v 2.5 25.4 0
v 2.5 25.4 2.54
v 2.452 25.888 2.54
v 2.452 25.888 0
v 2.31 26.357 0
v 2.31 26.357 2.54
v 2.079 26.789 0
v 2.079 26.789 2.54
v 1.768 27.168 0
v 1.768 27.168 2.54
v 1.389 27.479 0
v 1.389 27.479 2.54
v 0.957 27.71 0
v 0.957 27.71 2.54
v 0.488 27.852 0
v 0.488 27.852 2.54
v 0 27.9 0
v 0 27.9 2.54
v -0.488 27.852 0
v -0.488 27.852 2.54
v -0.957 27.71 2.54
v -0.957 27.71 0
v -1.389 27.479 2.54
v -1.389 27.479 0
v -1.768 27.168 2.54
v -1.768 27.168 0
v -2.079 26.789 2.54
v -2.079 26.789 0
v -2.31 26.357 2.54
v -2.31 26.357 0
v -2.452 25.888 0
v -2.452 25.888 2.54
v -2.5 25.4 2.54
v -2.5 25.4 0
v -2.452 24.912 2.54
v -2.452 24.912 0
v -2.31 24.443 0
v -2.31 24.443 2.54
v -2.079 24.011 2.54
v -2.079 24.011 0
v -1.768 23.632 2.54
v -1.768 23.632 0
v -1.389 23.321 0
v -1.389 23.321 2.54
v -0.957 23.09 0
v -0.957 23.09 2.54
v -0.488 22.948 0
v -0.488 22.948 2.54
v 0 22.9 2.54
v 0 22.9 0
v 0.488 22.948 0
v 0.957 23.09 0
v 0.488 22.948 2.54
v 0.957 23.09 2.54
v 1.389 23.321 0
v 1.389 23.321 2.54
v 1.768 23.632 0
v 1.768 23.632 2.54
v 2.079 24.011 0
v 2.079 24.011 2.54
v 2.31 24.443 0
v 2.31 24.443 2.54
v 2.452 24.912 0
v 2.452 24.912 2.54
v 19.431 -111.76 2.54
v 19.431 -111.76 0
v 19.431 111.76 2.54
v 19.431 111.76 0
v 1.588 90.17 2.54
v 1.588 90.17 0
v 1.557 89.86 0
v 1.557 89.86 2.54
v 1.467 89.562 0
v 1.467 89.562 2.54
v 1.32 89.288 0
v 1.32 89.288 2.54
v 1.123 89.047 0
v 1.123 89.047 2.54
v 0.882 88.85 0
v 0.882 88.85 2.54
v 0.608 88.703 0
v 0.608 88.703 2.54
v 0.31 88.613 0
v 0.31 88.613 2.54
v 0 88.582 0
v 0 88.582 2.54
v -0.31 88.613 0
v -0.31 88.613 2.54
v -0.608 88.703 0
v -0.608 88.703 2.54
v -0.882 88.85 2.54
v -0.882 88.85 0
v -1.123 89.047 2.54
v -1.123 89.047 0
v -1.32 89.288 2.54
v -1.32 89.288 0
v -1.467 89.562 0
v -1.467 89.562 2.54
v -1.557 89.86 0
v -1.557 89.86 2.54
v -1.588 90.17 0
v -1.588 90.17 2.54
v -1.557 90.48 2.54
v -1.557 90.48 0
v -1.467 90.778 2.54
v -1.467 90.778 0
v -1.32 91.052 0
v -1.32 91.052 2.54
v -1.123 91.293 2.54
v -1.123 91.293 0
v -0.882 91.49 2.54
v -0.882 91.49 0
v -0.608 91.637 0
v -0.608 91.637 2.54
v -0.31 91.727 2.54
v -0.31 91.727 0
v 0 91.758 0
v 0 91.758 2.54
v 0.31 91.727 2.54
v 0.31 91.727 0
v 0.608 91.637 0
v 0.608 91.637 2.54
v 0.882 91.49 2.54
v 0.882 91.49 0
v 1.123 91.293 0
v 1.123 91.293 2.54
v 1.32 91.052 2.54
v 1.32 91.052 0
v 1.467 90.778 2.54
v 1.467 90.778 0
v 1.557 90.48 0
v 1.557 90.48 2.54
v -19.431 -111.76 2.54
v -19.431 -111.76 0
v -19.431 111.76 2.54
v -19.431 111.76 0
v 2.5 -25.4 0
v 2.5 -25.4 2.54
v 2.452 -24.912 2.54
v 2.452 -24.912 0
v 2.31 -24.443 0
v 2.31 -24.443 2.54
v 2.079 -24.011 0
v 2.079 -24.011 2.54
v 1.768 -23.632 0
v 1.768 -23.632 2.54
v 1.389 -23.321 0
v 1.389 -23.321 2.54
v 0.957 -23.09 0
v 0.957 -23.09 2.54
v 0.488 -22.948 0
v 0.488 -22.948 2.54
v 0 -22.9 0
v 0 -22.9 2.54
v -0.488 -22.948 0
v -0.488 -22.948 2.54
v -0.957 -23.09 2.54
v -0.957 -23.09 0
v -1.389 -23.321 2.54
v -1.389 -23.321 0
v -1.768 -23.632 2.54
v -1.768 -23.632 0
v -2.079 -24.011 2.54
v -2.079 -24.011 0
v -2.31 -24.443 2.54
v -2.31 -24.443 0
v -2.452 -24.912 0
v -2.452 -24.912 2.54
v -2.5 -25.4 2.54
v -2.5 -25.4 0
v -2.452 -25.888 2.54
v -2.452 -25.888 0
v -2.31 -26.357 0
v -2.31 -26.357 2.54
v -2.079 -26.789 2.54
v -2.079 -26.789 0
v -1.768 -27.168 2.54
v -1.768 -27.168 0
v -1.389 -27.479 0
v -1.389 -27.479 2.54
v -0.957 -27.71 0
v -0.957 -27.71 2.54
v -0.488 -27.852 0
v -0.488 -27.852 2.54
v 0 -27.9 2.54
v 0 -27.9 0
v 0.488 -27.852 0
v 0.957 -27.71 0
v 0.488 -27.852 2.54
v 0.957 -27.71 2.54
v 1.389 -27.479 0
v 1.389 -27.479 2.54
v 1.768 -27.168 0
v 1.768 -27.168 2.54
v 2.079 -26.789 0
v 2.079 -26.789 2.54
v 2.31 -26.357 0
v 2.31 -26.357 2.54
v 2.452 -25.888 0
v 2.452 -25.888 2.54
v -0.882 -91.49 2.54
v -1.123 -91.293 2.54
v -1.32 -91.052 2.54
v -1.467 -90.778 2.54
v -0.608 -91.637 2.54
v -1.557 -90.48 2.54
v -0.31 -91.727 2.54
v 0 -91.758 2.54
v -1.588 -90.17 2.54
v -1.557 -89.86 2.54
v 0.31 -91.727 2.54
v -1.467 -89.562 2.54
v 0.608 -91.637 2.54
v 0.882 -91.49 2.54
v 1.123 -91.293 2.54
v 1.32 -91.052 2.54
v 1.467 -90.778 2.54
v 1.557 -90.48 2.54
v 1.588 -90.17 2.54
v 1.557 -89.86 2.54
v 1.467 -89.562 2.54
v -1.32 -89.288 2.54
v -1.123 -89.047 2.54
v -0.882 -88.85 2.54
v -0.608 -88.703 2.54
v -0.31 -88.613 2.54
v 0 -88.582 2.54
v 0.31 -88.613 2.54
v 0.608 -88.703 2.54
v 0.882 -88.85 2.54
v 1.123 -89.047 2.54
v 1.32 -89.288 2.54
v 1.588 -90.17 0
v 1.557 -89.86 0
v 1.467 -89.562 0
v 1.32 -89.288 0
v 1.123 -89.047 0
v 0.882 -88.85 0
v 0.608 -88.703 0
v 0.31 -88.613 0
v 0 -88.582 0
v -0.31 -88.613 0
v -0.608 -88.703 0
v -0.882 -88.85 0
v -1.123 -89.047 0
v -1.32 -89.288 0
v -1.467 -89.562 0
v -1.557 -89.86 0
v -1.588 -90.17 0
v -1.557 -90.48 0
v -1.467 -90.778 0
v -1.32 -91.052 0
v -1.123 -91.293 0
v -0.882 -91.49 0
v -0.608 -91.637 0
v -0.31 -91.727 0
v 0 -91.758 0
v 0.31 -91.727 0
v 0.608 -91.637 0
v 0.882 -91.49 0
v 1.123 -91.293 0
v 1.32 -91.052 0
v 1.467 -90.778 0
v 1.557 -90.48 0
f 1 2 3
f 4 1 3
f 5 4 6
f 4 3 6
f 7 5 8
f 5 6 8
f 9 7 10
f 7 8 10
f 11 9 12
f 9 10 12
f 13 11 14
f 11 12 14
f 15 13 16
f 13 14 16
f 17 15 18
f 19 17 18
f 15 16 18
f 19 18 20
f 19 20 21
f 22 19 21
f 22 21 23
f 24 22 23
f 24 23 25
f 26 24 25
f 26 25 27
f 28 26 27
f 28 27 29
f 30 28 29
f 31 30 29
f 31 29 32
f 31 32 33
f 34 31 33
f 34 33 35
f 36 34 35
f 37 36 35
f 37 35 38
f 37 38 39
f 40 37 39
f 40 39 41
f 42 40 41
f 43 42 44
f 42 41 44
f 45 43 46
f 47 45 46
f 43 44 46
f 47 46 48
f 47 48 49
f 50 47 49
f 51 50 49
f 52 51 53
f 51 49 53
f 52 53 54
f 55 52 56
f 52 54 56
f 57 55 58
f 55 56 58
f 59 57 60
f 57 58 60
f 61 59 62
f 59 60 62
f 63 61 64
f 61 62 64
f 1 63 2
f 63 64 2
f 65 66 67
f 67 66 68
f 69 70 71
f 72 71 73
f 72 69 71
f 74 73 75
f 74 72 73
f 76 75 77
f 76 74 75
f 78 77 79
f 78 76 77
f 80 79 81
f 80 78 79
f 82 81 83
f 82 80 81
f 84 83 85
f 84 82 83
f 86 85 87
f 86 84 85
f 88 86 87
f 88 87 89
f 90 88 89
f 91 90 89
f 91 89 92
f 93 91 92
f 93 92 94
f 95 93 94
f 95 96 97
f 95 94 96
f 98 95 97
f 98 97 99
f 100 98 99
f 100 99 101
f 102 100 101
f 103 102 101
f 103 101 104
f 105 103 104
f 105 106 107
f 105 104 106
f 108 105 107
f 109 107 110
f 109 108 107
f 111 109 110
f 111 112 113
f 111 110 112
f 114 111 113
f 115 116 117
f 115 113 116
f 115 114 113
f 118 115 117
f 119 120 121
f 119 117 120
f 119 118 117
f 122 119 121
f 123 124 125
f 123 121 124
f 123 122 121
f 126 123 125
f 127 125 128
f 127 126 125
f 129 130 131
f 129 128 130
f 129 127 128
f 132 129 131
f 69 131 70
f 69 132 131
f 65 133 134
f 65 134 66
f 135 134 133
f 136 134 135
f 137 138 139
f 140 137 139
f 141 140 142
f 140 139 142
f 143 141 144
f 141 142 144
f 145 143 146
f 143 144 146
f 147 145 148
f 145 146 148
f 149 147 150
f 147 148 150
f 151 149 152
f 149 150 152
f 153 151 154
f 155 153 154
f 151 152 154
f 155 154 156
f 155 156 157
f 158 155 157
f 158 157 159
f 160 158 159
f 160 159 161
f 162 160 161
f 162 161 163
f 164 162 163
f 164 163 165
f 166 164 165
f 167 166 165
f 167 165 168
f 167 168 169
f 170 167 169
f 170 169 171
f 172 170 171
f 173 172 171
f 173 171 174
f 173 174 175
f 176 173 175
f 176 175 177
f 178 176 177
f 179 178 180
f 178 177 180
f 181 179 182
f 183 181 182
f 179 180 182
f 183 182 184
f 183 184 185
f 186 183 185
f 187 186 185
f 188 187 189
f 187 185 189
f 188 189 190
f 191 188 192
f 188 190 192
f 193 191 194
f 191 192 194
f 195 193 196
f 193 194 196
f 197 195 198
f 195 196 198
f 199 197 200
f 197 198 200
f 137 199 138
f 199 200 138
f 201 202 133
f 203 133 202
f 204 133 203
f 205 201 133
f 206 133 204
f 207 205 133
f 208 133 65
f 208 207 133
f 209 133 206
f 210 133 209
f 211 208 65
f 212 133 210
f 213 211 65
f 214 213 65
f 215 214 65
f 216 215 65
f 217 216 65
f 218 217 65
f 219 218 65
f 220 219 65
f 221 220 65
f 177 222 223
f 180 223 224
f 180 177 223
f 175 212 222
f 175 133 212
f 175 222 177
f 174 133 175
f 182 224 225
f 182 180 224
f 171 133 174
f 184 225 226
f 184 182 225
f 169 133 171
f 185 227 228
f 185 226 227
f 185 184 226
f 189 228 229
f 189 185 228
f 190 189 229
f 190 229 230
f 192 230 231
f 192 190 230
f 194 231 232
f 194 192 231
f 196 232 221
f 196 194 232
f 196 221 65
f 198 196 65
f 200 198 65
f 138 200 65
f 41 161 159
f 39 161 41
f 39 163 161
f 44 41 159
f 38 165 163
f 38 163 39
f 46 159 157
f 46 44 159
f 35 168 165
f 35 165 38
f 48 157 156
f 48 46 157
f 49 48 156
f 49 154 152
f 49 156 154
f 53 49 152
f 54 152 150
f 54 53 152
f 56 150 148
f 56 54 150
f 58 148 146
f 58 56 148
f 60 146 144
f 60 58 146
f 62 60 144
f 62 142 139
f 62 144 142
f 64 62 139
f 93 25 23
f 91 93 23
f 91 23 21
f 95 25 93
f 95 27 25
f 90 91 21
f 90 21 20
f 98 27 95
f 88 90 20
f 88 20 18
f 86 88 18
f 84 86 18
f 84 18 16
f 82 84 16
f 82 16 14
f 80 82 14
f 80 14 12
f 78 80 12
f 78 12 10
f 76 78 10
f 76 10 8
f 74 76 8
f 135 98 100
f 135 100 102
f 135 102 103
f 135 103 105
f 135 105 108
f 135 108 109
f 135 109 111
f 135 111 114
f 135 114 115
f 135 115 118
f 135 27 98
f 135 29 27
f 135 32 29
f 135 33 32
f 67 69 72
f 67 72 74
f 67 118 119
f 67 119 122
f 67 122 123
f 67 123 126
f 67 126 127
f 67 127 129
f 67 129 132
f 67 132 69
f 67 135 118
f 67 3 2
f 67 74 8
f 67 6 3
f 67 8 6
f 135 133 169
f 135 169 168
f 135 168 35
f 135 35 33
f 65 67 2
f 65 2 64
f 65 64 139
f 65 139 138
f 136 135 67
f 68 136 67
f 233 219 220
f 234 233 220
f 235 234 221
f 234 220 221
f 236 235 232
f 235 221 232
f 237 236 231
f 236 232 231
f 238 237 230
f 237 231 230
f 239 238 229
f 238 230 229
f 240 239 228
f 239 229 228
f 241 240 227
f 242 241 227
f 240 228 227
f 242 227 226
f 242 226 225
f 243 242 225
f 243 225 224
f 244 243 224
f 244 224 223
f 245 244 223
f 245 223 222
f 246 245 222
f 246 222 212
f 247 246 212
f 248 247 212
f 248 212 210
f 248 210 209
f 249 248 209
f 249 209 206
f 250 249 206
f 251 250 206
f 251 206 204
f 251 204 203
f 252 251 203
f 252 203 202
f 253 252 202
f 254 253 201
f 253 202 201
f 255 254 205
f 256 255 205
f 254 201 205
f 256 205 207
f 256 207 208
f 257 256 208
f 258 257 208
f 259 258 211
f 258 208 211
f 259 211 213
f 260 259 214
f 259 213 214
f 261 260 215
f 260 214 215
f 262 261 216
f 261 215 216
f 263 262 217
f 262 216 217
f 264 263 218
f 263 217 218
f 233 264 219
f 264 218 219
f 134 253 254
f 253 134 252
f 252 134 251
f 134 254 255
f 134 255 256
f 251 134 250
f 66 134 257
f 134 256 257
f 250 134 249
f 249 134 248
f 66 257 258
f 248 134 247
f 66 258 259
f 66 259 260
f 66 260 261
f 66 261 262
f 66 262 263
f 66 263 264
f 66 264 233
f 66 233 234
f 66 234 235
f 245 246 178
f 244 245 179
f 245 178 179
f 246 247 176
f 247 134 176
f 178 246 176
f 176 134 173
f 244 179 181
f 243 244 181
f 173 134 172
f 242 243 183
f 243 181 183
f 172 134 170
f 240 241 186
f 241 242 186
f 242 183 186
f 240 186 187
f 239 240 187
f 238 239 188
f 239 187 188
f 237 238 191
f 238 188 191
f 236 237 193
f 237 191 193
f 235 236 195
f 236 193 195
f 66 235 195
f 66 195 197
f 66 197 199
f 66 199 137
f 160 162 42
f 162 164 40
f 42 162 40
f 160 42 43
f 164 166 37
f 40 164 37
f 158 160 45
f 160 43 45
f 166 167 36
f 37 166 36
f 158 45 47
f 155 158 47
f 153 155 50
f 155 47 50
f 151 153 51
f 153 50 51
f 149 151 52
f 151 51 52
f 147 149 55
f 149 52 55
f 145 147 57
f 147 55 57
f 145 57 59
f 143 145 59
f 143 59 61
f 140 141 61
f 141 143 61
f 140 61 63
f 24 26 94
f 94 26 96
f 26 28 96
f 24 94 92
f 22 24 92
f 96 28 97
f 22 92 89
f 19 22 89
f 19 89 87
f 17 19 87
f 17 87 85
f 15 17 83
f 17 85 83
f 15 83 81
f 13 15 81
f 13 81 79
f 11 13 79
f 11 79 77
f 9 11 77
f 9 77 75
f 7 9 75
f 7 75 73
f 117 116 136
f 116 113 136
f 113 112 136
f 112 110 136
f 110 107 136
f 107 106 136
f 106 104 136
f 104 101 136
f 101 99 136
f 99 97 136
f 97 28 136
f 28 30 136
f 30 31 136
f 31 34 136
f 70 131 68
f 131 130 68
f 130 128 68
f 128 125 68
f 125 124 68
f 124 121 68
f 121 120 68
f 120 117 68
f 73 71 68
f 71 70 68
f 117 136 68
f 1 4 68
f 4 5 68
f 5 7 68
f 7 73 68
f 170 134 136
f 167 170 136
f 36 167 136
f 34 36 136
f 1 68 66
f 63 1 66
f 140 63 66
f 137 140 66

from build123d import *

# Parameters (mm, degrees)
SKETCH1_W           = 38.862
SKETCH1_H           = 228.6
BOSS_EXTRUDE1_DEPTH = 2.54
SKETCH2_R           = 1.5875
CUT_EXTRUDE1_DEPTH  = 116.967691022
SKETCH3_R           = 2.5
CUT_EXTRUDE2_DEPTH  = 5.08
SKETCH4_W           = 38.862
SKETCH4_H           = 2.54
CUT_EXTRUDE3_DEPTH  = 116.967691022


with BuildPart() as part:
    # Sketch1 → Boss-Extrude1 (new body)
    with BuildSketch(Plane.XY):
        Rectangle(SKETCH1_W, SKETCH1_H)
    extrude(amount=BOSS_EXTRUDE1_DEPTH)

    # Sketch2 → Cut-Extrude1 (cut, through all)
    with BuildSketch(Plane.XY.offset(2.54)):
        with Locations((0, -90.17)):
            Circle(SKETCH2_R)
    cut_extrude1 = extrude(amount=-CUT_EXTRUDE1_DEPTH, mode=Mode.SUBTRACT)

    # Mirror1: Cut-Extrude1 across plane
    add(cut_extrude1.mirror(Plane.ZX), mode=Mode.SUBTRACT)

    # Sketch3 → Cut-Extrude2 (cut)
    with BuildSketch(Plane.XY.offset(2.54)):
        with Locations((0, -25.4)):
            Circle(SKETCH3_R)
        with Locations((0, 25.4)):
            Circle(SKETCH3_R)
    extrude(amount=-CUT_EXTRUDE2_DEPTH, mode=Mode.SUBTRACT)

    # Sketch4 → Cut-Extrude3 (cut, through all)
    with BuildSketch(Plane.XY.offset(2.54)):
        with Locations((0, 113.03)):
            Rectangle(SKETCH4_W, SKETCH4_H)
        with Locations((0, -113.03)):
            Rectangle(SKETCH4_W, SKETCH4_H)
    extrude(amount=-CUT_EXTRUDE3_DEPTH, mode=Mode.SUBTRACT)


solid = part.part
